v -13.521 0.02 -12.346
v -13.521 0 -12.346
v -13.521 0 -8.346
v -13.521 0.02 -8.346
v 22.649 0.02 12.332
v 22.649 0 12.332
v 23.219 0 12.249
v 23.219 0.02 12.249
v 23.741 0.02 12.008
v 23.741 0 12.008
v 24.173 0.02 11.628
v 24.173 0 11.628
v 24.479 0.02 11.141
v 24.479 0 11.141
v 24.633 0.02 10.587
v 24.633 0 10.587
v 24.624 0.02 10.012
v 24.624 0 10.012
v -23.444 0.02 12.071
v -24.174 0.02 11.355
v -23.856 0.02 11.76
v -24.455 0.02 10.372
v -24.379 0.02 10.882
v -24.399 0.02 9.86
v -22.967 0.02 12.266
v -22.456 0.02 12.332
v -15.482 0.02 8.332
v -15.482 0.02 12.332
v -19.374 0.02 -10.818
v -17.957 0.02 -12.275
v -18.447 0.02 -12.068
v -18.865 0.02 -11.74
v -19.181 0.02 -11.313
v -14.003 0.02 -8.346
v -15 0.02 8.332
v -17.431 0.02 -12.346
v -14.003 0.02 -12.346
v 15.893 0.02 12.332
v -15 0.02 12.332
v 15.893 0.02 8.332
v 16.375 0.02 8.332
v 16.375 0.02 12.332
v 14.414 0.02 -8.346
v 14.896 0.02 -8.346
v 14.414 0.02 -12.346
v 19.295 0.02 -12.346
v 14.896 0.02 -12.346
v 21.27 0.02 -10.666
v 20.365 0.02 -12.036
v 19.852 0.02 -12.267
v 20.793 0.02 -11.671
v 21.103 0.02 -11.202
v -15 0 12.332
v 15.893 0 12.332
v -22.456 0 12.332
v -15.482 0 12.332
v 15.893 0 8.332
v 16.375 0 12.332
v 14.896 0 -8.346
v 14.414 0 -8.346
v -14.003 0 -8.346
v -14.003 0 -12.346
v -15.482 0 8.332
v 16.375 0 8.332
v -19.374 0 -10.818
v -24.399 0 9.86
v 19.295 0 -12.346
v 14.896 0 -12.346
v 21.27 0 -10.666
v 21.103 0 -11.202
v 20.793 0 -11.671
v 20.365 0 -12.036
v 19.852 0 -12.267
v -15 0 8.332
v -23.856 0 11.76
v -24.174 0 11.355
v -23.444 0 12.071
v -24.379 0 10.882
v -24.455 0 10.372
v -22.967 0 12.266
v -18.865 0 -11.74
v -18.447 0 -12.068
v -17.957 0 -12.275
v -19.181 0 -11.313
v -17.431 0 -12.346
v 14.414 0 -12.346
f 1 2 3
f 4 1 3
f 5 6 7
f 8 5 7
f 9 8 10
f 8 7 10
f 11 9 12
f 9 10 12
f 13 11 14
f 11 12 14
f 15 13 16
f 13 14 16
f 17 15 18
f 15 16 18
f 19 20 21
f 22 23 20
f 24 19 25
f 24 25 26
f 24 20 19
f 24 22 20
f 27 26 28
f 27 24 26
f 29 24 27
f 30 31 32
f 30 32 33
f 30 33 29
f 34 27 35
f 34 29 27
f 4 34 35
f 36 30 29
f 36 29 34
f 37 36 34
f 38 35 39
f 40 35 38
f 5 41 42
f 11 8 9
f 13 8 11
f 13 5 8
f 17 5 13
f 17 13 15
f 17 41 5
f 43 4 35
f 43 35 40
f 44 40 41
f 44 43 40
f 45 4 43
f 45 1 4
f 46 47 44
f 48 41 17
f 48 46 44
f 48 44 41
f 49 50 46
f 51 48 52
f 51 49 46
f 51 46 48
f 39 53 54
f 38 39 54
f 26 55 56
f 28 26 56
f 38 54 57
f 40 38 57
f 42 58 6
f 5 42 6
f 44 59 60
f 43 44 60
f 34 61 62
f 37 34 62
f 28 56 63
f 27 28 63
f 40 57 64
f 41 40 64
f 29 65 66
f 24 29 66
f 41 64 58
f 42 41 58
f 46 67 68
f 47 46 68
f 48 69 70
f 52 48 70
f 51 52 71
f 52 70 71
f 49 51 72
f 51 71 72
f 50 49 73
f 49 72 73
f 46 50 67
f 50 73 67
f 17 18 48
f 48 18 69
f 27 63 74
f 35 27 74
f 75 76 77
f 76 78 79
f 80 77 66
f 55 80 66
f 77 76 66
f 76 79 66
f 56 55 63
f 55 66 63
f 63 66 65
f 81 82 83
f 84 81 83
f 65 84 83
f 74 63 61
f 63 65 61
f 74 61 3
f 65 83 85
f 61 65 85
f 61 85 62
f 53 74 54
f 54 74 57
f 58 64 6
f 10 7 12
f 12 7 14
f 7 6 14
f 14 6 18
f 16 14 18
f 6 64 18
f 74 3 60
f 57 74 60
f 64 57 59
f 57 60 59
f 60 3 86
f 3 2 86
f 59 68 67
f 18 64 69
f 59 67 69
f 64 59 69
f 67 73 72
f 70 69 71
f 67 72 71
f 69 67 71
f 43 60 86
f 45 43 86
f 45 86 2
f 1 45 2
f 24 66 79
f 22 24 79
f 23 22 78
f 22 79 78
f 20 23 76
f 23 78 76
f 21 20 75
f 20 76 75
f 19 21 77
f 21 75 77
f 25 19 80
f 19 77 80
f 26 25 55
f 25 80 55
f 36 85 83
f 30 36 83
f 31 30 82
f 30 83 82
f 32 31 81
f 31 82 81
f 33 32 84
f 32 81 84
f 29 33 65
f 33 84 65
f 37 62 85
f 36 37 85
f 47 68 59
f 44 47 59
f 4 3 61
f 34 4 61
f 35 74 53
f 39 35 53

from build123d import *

# Parameters (mm, degrees)
BOSS_EXTRUDE1_DEPTH = 0.02


with BuildPart() as part:
    # Parametric Corte Laser → Boss-Extrude1 (new body)
    with BuildSketch(Plane(origin=(0, 0, 0), x_dir=(1, 0, 0), z_dir=(0, 1, 0))):
        with BuildLine():
            ThreePointArc((-24.399182899, -9.859654755), (-24.028101077, -11.567952641), (-22.455748148, -12.331948487))
            Line((-22.455748148, -12.331948487), (-15.482, -12.331948487))
            Line((-15.482, -12.331948487), (-15.482, -8.331948487))
            Line((-15.482, -8.331948487), (-15, -8.331948487))
            Line((-15, -8.331948487), (-15, -12.331948487))
            Line((-15, -12.331948487), (15.893230755, -12.331948487))
            Line((15.893230755, -12.331948487), (15.893230755, -8.331948487))
            Line((15.893230755, -8.331948487), (16.375230755, -8.331948487))
            Line((16.375230755, -8.331948487), (16.375230755, -12.331948487))
            Line((16.375230755, -12.331948487), (22.649443378, -12.331948487))
            ThreePointArc((22.649443378, -12.331948487), (24.172673665, -11.628007704), (24.62364003, -10.01171798))
            Line((24.62364003, -10.01171798), (21.269590724, 10.665740175))
            ThreePointArc((21.269590724, 10.665740175), (20.591453289, 11.868739955), (19.295394072, 12.345509668))
            Line((19.295394072, 12.345509668), (14.896112094, 12.345509668))
            Line((14.896112094, 12.345509668), (14.896112094, 8.345509668))
            Line((14.896112094, 8.345509668), (14.414112094, 8.345509668))
            Line((14.414112094, 8.345509668), (14.414112094, 12.345509668))
            Line((14.414112094, 12.345509668), (-13.52088134, 12.345509668))
            Line((-13.52088134, 12.345509668), (-13.52088134, 8.345509668))
            Line((-13.52088134, 8.345509668), (-14.00288134, 8.345509668))
            Line((-14.00288134, 8.345509668), (-14.00288134, 12.345509668))
            Line((-14.00288134, 12.345509668), (-17.430709938, 12.345509668))
            ThreePointArc((-17.430709938, 12.345509668), (-18.666714092, 11.917862596), (-19.374144689, 10.8178034))
            Line((-19.374144689, 10.8178034), (-24.399182899, -9.859654755))
        make_face()
    extrude(amount=BOSS_EXTRUDE1_DEPTH)


solid = part.part
